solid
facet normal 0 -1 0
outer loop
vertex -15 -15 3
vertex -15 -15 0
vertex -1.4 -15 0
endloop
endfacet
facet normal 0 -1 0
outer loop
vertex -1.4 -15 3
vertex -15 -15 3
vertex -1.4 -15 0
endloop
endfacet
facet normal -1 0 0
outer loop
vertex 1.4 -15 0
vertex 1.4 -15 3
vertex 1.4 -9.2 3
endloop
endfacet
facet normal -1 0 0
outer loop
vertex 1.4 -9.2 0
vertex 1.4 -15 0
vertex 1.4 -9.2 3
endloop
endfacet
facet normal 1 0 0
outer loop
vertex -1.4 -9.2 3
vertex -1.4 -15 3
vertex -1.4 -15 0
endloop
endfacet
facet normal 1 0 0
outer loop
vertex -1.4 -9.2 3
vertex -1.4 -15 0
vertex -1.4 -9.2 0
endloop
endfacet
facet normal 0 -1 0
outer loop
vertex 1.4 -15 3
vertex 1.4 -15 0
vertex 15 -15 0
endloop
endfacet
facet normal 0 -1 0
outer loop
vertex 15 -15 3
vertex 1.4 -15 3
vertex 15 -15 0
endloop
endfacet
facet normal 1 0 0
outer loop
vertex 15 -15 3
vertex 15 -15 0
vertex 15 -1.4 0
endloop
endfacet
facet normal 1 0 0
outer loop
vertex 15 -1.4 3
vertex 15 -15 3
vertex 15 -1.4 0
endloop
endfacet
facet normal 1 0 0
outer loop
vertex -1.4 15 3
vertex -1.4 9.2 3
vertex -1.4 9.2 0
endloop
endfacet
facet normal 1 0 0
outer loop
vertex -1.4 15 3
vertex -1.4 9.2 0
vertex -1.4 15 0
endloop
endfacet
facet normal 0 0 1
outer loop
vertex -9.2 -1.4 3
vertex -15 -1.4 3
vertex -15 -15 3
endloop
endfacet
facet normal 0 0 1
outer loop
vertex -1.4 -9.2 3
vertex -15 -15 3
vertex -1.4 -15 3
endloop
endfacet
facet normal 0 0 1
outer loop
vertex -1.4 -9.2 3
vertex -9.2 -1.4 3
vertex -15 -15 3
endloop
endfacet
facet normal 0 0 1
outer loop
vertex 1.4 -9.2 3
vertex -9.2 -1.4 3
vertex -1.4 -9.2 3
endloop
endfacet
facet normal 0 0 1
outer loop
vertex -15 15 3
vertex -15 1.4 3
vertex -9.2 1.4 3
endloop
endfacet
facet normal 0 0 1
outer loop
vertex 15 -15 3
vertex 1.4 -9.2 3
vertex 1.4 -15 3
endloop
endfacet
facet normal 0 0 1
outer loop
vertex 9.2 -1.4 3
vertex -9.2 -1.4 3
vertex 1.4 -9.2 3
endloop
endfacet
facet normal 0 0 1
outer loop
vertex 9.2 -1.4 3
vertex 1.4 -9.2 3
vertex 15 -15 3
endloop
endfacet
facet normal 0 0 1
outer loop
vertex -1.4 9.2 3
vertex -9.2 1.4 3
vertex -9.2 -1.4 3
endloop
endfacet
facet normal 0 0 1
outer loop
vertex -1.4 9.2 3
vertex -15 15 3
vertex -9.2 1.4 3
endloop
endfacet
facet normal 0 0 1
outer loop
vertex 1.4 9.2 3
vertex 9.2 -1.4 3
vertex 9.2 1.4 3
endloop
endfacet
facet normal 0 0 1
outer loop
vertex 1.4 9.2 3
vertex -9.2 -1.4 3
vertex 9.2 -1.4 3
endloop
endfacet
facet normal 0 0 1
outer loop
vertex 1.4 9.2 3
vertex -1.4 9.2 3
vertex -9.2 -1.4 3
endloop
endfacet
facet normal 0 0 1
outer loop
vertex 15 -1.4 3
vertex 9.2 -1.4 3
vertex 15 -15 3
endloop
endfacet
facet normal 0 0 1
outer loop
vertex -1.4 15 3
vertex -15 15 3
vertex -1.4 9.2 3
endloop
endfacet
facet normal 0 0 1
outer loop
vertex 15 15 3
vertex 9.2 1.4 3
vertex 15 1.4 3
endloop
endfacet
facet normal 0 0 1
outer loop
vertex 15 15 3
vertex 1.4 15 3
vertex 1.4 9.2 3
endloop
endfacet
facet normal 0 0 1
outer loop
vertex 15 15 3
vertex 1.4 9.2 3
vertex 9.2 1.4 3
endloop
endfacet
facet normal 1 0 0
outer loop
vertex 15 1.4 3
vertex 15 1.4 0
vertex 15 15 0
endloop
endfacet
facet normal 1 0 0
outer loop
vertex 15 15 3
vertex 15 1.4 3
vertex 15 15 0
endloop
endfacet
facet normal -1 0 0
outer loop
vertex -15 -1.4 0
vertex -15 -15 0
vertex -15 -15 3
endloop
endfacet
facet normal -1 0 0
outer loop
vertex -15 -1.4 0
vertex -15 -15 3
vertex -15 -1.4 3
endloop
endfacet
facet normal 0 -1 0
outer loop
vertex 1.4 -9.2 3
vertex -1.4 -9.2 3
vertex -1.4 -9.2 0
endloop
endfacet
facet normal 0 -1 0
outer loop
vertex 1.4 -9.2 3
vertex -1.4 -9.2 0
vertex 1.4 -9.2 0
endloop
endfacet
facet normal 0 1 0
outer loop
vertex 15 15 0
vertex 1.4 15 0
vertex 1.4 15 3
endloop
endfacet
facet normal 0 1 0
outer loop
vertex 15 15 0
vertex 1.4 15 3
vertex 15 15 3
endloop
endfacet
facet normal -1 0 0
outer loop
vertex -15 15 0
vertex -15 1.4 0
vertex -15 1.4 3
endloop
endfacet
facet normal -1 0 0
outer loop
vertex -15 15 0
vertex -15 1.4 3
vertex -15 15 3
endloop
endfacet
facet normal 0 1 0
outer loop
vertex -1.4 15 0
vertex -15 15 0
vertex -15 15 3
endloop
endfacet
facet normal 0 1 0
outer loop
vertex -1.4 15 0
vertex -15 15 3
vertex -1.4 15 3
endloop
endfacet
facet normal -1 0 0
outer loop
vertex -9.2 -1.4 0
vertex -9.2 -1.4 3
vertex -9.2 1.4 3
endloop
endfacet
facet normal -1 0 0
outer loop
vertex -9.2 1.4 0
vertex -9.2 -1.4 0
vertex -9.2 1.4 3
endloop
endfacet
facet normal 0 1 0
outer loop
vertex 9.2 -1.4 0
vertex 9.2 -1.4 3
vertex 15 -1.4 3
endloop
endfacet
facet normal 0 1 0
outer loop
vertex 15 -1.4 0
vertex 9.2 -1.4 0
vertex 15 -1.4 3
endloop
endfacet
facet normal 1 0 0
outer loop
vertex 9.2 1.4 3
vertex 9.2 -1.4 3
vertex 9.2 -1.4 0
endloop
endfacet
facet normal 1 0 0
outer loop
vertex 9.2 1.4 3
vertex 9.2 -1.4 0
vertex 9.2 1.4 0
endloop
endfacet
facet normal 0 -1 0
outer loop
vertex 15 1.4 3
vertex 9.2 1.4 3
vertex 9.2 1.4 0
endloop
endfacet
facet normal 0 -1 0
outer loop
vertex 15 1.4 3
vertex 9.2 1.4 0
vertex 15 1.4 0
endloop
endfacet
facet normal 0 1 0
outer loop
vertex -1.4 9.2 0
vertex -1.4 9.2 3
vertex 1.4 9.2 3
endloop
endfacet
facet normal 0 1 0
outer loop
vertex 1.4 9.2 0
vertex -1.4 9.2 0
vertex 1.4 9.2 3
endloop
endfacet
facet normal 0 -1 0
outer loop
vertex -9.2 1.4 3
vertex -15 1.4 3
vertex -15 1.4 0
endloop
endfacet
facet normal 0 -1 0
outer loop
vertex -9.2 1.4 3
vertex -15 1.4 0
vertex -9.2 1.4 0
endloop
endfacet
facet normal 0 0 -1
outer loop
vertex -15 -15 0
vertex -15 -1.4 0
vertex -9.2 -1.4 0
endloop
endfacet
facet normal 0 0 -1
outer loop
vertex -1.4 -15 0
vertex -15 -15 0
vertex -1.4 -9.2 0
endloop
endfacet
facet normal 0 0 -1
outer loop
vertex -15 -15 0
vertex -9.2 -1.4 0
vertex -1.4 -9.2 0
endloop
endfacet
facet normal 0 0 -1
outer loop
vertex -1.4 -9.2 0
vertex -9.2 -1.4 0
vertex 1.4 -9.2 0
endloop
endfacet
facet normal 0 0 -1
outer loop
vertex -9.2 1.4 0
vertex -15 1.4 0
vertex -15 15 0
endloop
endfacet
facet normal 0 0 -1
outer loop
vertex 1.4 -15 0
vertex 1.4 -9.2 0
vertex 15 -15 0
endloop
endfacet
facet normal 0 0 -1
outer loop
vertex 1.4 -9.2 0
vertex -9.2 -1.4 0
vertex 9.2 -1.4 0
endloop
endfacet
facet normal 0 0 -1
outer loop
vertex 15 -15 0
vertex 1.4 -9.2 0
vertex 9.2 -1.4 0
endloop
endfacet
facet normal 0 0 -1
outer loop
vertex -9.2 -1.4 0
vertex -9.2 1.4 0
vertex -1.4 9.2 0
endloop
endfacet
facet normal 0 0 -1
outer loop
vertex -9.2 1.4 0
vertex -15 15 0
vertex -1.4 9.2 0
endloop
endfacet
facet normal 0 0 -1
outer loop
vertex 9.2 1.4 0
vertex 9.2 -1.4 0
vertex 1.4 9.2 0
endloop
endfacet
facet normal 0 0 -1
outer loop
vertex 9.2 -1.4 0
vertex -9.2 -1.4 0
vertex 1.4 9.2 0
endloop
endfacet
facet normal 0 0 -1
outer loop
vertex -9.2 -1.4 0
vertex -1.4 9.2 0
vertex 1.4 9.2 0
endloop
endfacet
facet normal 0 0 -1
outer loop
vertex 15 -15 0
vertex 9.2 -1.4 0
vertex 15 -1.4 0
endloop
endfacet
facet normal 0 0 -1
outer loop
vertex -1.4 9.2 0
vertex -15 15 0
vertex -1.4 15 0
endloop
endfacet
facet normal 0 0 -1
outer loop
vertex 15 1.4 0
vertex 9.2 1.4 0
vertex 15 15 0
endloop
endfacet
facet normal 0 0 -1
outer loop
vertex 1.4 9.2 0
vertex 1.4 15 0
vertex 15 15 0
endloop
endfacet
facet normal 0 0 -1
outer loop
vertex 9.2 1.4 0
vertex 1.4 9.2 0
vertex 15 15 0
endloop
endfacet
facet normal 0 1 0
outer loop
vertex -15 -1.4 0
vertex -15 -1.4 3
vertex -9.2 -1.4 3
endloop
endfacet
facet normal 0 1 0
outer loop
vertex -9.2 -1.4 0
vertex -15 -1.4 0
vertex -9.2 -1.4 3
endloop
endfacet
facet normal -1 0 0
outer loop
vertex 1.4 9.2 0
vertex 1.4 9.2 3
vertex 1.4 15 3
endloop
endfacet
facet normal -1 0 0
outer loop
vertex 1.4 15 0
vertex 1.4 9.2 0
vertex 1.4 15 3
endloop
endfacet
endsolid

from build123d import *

# Parameters (mm, degrees)
SKETCH1_W               = 30
SKETCH1_H               = 30
BOSS_EXTRUDE1_DEPTH     = 3
SKETCH2_W               = 2.8
SKETCH2_H               = 5.8
SKETCH2_W_2             = 5.8
SKETCH2_H_2             = 2.8
CUT_EXTRUDE1_DEPTH      = 1
CUT_EXTRUDE1_DEPTH_BACK = 4


with BuildPart() as part:
    # Sketch1 → Boss-Extrude1 (new body)
    with BuildSketch(Plane.XY):
        Rectangle(SKETCH1_W, SKETCH1_H)
    extrude(amount=BOSS_EXTRUDE1_DEPTH)

    # Sketch2 → Cut-Extrude1 (cut, two sides)
    with BuildSketch(Plane.XY.offset(3)) as cut_extrude1_sk:
        with Locations((0, 12.1)):
            Rectangle(SKETCH2_W, SKETCH2_H)
        with Locations((0, -12.1)):
            Rectangle(SKETCH2_W, SKETCH2_H)
        with Locations((-12.1, 0)):
            Rectangle(SKETCH2_W_2, SKETCH2_H_2)
        with Locations((12.1, 0)):
            Rectangle(SKETCH2_W_2, SKETCH2_H_2)
    extrude(amount=CUT_EXTRUDE1_DEPTH, mode=Mode.SUBTRACT)
    extrude(cut_extrude1_sk.sketch, amount=-CUT_EXTRUDE1_DEPTH_BACK, mode=Mode.SUBTRACT)


solid = part.part
